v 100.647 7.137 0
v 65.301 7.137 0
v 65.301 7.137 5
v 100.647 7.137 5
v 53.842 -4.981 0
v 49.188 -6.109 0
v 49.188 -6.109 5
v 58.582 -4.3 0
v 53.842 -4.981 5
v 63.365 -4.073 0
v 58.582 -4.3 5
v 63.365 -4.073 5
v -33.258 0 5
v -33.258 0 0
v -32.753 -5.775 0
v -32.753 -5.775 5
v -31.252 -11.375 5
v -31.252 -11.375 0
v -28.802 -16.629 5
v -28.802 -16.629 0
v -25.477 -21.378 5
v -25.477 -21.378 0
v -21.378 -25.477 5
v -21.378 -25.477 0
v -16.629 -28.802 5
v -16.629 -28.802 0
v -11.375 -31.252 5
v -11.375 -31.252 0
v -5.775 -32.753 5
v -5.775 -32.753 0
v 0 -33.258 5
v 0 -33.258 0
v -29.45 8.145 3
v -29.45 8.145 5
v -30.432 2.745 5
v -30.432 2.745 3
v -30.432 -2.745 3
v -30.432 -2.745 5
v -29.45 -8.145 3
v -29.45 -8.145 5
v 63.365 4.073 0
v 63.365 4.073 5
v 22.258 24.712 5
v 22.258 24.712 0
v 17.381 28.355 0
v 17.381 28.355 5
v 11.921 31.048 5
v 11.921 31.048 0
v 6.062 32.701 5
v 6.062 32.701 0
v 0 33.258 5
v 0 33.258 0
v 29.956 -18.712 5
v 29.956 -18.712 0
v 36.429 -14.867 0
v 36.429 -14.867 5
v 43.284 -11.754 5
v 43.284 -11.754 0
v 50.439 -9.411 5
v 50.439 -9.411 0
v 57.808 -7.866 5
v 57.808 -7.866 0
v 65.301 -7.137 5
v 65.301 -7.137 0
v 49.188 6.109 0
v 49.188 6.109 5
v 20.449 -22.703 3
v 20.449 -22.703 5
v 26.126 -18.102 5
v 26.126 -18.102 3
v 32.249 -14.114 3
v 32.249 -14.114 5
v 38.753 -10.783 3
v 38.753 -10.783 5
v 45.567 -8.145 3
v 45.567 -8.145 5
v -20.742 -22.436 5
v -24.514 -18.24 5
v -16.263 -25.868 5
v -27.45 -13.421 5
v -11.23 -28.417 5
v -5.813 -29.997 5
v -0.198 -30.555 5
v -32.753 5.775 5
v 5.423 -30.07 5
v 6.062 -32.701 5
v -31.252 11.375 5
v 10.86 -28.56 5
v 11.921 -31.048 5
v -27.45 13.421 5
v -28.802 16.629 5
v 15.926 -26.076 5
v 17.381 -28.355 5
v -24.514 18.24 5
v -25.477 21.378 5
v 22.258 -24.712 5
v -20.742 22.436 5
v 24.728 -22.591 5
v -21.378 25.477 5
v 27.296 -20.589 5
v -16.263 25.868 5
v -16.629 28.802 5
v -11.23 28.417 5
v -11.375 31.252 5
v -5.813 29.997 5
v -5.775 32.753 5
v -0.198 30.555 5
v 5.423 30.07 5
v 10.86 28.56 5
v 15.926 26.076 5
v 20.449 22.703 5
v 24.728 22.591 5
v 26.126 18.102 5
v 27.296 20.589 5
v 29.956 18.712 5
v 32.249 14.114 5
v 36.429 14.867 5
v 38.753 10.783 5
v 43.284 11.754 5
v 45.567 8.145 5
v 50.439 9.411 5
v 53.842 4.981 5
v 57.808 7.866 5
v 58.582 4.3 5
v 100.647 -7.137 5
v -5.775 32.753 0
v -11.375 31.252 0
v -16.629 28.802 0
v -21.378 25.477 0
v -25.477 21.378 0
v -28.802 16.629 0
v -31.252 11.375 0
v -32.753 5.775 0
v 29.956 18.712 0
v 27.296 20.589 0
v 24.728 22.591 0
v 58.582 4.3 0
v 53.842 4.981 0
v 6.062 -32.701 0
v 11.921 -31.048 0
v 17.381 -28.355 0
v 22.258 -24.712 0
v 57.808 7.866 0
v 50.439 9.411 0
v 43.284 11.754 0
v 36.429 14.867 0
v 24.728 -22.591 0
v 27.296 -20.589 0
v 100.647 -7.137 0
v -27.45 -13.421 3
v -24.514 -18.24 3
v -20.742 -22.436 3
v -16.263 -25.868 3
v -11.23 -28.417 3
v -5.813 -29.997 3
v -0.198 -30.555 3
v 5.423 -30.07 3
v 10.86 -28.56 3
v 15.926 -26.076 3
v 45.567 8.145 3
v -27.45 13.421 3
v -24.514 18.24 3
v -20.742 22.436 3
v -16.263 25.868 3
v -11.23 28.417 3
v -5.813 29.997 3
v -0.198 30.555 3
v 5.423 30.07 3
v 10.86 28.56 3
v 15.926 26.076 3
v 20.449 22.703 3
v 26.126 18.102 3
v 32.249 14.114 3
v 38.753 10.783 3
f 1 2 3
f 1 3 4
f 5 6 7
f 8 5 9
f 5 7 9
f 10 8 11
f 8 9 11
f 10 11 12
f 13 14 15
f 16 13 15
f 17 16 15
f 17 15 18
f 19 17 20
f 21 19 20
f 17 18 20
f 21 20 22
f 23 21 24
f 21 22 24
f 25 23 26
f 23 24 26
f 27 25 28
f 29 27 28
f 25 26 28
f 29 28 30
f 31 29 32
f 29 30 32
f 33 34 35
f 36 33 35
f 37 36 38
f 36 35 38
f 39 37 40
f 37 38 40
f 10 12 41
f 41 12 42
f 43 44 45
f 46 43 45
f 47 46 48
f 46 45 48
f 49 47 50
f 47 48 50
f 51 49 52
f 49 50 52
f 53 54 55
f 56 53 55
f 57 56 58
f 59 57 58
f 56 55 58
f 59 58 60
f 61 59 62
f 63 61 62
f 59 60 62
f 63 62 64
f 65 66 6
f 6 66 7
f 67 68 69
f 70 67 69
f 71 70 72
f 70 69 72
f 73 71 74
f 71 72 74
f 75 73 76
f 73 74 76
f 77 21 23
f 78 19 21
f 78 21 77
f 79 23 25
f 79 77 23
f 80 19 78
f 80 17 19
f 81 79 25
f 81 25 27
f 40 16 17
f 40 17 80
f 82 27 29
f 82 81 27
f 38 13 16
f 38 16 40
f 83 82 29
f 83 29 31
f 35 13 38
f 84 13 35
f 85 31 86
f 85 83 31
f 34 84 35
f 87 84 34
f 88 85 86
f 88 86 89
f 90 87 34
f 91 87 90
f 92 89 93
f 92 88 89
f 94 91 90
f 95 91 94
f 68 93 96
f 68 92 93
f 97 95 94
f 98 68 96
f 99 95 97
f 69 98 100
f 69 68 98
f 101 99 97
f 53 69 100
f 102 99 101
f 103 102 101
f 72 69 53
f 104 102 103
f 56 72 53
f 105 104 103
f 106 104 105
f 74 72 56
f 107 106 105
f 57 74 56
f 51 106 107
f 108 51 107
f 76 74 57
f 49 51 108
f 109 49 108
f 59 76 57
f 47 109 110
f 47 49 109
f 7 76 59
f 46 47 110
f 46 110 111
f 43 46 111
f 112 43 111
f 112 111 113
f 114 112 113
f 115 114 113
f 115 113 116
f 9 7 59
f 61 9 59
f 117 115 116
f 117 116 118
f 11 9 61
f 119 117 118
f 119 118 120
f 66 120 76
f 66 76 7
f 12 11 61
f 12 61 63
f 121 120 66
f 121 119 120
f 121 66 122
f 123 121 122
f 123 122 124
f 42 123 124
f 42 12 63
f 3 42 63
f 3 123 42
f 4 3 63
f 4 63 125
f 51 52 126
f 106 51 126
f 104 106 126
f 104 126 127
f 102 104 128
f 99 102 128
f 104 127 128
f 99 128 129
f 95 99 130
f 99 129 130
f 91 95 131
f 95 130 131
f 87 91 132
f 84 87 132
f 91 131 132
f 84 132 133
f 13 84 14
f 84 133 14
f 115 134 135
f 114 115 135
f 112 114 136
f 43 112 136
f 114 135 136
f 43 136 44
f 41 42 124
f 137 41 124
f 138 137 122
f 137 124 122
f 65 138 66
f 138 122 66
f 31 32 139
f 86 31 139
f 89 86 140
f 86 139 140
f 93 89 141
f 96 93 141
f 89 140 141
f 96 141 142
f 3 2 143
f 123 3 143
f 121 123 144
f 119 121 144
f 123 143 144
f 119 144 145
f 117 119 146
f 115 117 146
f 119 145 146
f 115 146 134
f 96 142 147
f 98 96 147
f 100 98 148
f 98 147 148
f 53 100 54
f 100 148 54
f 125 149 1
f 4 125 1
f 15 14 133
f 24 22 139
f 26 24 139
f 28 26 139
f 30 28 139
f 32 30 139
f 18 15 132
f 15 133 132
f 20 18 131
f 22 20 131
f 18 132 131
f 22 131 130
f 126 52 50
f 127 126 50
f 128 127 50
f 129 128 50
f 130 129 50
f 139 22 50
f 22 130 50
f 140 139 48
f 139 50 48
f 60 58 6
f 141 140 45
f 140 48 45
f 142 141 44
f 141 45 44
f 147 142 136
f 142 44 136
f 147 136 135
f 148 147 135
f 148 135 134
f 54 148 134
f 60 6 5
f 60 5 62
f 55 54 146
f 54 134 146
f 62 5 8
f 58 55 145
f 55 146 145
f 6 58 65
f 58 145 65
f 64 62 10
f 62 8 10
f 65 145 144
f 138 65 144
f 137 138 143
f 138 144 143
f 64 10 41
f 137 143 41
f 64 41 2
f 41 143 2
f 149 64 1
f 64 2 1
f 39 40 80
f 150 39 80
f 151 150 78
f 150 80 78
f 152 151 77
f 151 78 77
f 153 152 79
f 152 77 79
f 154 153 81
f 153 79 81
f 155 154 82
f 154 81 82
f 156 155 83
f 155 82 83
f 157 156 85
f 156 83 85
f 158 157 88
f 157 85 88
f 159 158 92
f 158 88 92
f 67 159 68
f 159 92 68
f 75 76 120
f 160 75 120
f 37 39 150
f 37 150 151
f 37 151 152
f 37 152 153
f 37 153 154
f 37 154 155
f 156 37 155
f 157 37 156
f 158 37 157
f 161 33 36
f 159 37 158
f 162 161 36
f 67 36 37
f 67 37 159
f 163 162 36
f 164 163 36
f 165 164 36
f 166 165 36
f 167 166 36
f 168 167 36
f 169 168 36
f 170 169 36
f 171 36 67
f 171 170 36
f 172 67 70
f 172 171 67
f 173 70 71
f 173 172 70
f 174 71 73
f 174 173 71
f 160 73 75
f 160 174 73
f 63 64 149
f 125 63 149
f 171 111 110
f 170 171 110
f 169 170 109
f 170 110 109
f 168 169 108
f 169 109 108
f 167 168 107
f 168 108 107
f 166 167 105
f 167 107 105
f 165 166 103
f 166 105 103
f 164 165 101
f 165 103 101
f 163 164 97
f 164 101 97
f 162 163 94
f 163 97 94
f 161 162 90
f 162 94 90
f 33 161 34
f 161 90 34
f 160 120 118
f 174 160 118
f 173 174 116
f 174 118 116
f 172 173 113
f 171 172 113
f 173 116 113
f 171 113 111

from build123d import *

# Parameters (mm, degrees)
F0_W     = 29.9560762942
F0_H     = 7.1370224468
F0_W_2   = 35.3452544659
F1_DEPTH = 5
F2_W     = 3.7603338286
F2_H     = 4.0725159595
F2_W_2   = 14.1769461334
F3_DEPTH = 2
F4_DEPTH = 25


with BuildPart() as f1:
    # F0 (on Top) → F1 (new body)
    with BuildSketch(Plane.XY):
        with BuildLine():
            Line((0, 7.1370224468), (0, 33.2578741251))
            ThreePointArc((0, 33.2578741251), (-23.5168683217, 23.5168683217), (-33.2578741251, 0))
            Line((-33.2578741251, 0), (-29.9560762942, 0))
            Line((-29.9560762942, 0), (-29.9560762942, 7.1370224468))
            Line((-29.9560762942, 7.1370224468), (0, 7.1370224468))
        make_face()
        with BuildLine():
            Line((-29.9560762942, 0), (-33.2578741251, 0))
            ThreePointArc((-33.2578741251, 0), (-23.5168683217, -23.5168683217), (0, -33.2578741251))
            Line((0, -33.2578741251), (0, -7.1370224468))
            Line((0, -7.1370224468), (-29.9560762942, -7.1370224468))
            Line((-29.9560762942, -7.1370224468), (-29.9560762942, 0))
        make_face()
        with Locations((-14.9780381471, -3.5685112234)):
            Rectangle(F0_W, F0_H)
        with Locations((-14.9780381471, 3.5685112234)):
            Rectangle(F0_W, F0_H)
        with BuildLine():
            Line((0, -7.1370224468), (0, -33.2578741251))
            ThreePointArc((0, -33.2578741251), (11.9212758791, -31.0478561697), (22.2581910956, -24.7115179719))
            Line((22.2581910956, -24.7115179719), (6.4284682817, -7.1370224468))
            Line((6.4284682817, -7.1370224468), (0, -7.1370224468))
        make_face()
        with BuildLine():
            Line((29.9560762942, -7.1370224468), (6.4284682817, -7.1370224468))
            Line((6.4284682817, -7.1370224468), (22.2581910956, -24.7115179719))
            ThreePointArc((22.2581910956, -24.7115179719), (26.6068003283, -19.95405642), (29.9560762942, -14.4471341234))
            Line((29.9560762942, -14.4471341234), (29.9560762942, -7.1370224468))
        make_face()
        Polygon((6.4284682817, -7.1370224468), (0, 0), (0, -7.1370224468), align=None)
        Polygon((29.9560762942, 0), (0, 0), (6.4284682817, -7.1370224468), (29.9560762942, -7.1370224468), align=None)
        Polygon((29.9560762942, 7.1370224468), (6.4284682817, 7.1370224468), (0, 0), (29.9560762942, 0), align=None)
        Polygon((0, 0), (6.4284682817, 7.1370224468), (0, 7.1370224468), align=None)
        with BuildLine():
            ThreePointArc((29.9560762942, 14.4471341234), (26.6068003283, 19.95405642), (22.2581910956, 24.7115179719))
            Line((22.2581910956, 24.7115179719), (6.4284682817, 7.1370224468))
            Line((6.4284682817, 7.1370224468), (29.9560762942, 7.1370224468))
            Line((29.9560762942, 7.1370224468), (29.9560762942, 14.4471341234))
        make_face()
        with BuildLine():
            Line((6.4284682817, 7.1370224468), (22.2581910956, 24.7115179719))
            ThreePointArc((22.2581910956, 24.7115179719), (11.9212758791, 31.0478561697), (0, 33.2578741251))
            Line((0, 33.2578741251), (0, 7.1370224468))
            Line((0, 7.1370224468), (6.4284682817, 7.1370224468))
        make_face()
        with BuildLine():
            ThreePointArc((29.9560762942, 18.7118758373), (26.0003436233, 21.5746791136), (22.2581910956, 24.7115179719))
            ThreePointArc((22.2581910956, 24.7115179719), (26.6068003283, 19.95405642), (29.9560762942, 14.4471341234))
            Line((29.9560762942, 14.4471341234), (29.9560762942, 18.7118758373))
        make_face()
        with BuildLine():
            ThreePointArc((29.9560762942, -14.4471341234), (26.6068003283, -19.95405642), (22.2581910956, -24.7115179719))
            ThreePointArc((22.2581910956, -24.7115179719), (26.0003436233, -21.5746791136), (29.9560762942, -18.7118758373))
            Line((29.9560762942, -18.7118758373), (29.9560762942, -14.4471341234))
        make_face()
        with BuildLine():
            ThreePointArc((29.9560762942, -14.4471341234), (31.4327985964, -10.8657886838), (32.4830586909, -7.1370224468))
            Line((32.4830586909, -7.1370224468), (29.9560762942, -7.1370224468))
            Line((29.9560762942, -7.1370224468), (29.9560762942, -14.4471341234))
        make_face()
        with BuildLine():
            ThreePointArc((32.4830586909, -7.1370224468), (33.0636028622, -3.5894786656), (33.2578741251, 0))
            Line((33.2578741251, 0), (29.9560762942, 0))
            Line((29.9560762942, 0), (29.9560762942, -7.1370224468))
            Line((29.9560762942, -7.1370224468), (32.4830586909, -7.1370224468))
        make_face()
        with BuildLine():
            ThreePointArc((33.2578741251, 0), (33.0636028622, 3.5894786656), (32.4830586909, 7.1370224468))
            Line((32.4830586909, 7.1370224468), (29.9560762942, 7.1370224468))
            Line((29.9560762942, 7.1370224468), (29.9560762942, 0))
            Line((29.9560762942, 0), (33.2578741251, 0))
        make_face()
        with BuildLine():
            ThreePointArc((32.4830586909, 7.1370224468), (31.4327985964, 10.8657886838), (29.9560762942, 14.4471341234))
            Line((29.9560762942, 14.4471341234), (29.9560762942, 7.1370224468))
            Line((29.9560762942, 7.1370224468), (32.4830586909, 7.1370224468))
        make_face()
        with BuildLine():
            Line((29.9560762942, 18.7118758373), (29.9560762942, 14.4471341234))
            ThreePointArc((29.9560762942, 14.4471341234), (31.4327985964, 10.8657886838), (32.4830586909, 7.1370224468))
            Line((32.4830586909, 7.1370224468), (65.3013307601, 7.1370224468))
            ThreePointArc((65.3013307601, 7.1370224468), (46.829633004, 10.4843879142), (29.9560762942, 18.7118758373))
        make_face()
        with BuildLine():
            Line((65.3013307601, 7.1370224468), (32.4830586909, 7.1370224468))
            ThreePointArc((32.4830586909, 7.1370224468), (33.0636028622, 3.5894786656), (33.2578741251, 0))
            Line((33.2578741251, 0), (65.3013307601, 0))
            Line((65.3013307601, 0), (65.3013307601, 7.1370224468))
        make_face()
        with BuildLine():
            Line((65.3013307601, 0), (33.2578741251, 0))
            ThreePointArc((33.2578741251, 0), (33.0636028622, -3.5894786656), (32.4830586909, -7.1370224468))
            Line((32.4830586909, -7.1370224468), (65.3013307601, -7.1370224468))
            Line((65.3013307601, -7.1370224468), (65.3013307601, 0))
        make_face()
        with BuildLine():
            Line((65.3013307601, -7.1370224468), (32.4830586909, -7.1370224468))
            ThreePointArc((32.4830586909, -7.1370224468), (31.4327985964, -10.8657886838), (29.9560762942, -14.4471341234))
            Line((29.9560762942, -14.4471341234), (29.9560762942, -18.7118758373))
            ThreePointArc((29.9560762942, -18.7118758373), (46.829633004, -10.4843879142), (65.3013307601, -7.1370224468))
        make_face()
        with Locations((82.9739579931, -3.5685112234)):
            Rectangle(F0_W_2, F0_H)
        with Locations((82.9739579931, 3.5685112234)):
            Rectangle(F0_W_2, F0_H)
    extrude(amount=F1_DEPTH)

    # F2 (on face) → F3 (cut)
    with BuildSketch(Plane.XY.offset(5)):
        with BuildLine():
            Line((7.3364039044, 8.145031919), (29.4496861323, 8.145031919))
            ThreePointArc((29.4496861323, 8.145031919), (25.9897625324, 16.0672898076), (20.4494554433, 22.703421115))
            Line((20.4494554433, 22.703421115), (7.3364039044, 8.145031919))
        make_face()
        with BuildLine():
            Line((45.5672070233, 8.145031919), (29.4496861323, 8.145031919))
            ThreePointArc((29.4496861323, 8.145031919), (29.9355135784, 6.1229555814), (30.2826711505, 4.0725159595))
            Line((30.2826711505, 4.0725159595), (45.5672070233, 4.0725159595))
            Line((45.5672070233, 4.0725159595), (45.5672070233, 5.9387854649))
            Line((45.5672070233, 5.9387854649), (45.5672070233, 8.145031919))
        make_face()
        Polygon((29.4496861323, 4.0725159595), (29.4496861323, 8.145031919), (7.3364039044, 8.145031919), (3.6682019522, 4.0725159595), (25.6893523037, 4.0725159595), align=None)
        with BuildLine():
            ThreePointArc((30.2826711505, 4.0725159595), (29.9355135784, 6.1229555814), (29.4496861323, 8.145031919))
            Line((29.4496861323, 8.145031919), (29.4496861323, 4.0725159595))
            Line((29.4496861323, 4.0725159595), (30.2826711505, 4.0725159595))
        make_face()
        with BuildLine():
            ThreePointArc((20.4494554433, 22.703421115), (25.9897625324, 16.0672898076), (29.4496861323, 8.145031919))
            Line((29.4496861323, 8.145031919), (45.5672070233, 8.145031919))
            ThreePointArc((45.5672070233, 8.145031919), (32.2488302064, 14.1138509074), (20.4494554433, 22.703421115))
        make_face()
        with BuildLine():
            Line((7.3364039044, 8.145031919), (20.4494554433, 22.703421115))
            ThreePointArc((20.4494554433, 22.703421115), (-8.557903488, 29.3323685737), (-29.4496861323, 8.145031919))
            Line((-29.4496861323, 8.145031919), (7.3364039044, 8.145031919))
        make_face()
        with BuildLine():
            Line((45.5672070233, 4.0725159595), (30.2826711505, 4.0725159595))
            ThreePointArc((30.2826711505, 4.0725159595), (30.4870567923, 2.0408151309), (30.5552869116, 0))
            Line((30.5552869116, 0), (45.5672070233, 0))
            Line((45.5672070233, 0), (45.5672070233, 4.0725159595))
        make_face()
        with BuildLine():
            ThreePointArc((30.5552869116, 0), (30.4870567923, 2.0408151309), (30.2826711505, 4.0725159595))
            Line((30.2826711505, 4.0725159595), (29.4496861323, 4.0725159595))
            Line((29.4496861323, 4.0725159595), (29.4496861323, 0))
            Line((29.4496861323, 0), (30.5552869116, 0))
        make_face()
        Polygon((3.6682019522, 4.0725159595), (7.3364039044, 8.145031919), (-29.4496861323, 8.145031919), (-29.4496861323, -8.145031919), (7.3364039044, -8.145031919), (3.6682019522, -4.0725159595), (-25.6893523037, -4.0725159595), (-25.6893523037, 4.0725159595), align=None)
        with Locations((27.569519218, 2.0362579798)):
            Rectangle(F2_W, F2_H)
        with BuildLine():
            Line((-29.4496861323, -8.145031919), (-29.4496861323, 8.145031919))
            ThreePointArc((-29.4496861323, 8.145031919), (-30.5552869116, 0), (-29.4496861323, -8.145031919))
        make_face()
        with BuildLine():
            Line((45.5672070233, 0), (30.5552869116, 0))
            ThreePointArc((30.5552869116, 0), (30.4870567923, -2.0408151309), (30.2826711505, -4.0725159595))
            Line((30.2826711505, -4.0725159595), (45.5672070233, -4.0725159595))
            Line((45.5672070233, -4.0725159595), (45.5672070233, 0))
        make_face()
        with BuildLine():
            ThreePointArc((30.2826711505, -4.0725159595), (30.4870567923, -2.0408151309), (30.5552869116, 0))
            Line((30.5552869116, 0), (29.4496861323, 0))
            Line((29.4496861323, 0), (29.4496861323, -4.0725159595))
            Line((29.4496861323, -4.0725159595), (30.2826711505, -4.0725159595))
        make_face()
        Polygon((25.6893523037, 4.0725159595), (3.6682019522, 4.0725159595), (0, 0), (25.6893523037, 0), align=None)
        Polygon((0, 0), (3.6682019522, 4.0725159595), (-25.6893523037, 4.0725159595), (-25.6893523037, -4.0725159595), (3.6682019522, -4.0725159595), align=None)
        with Locations((27.569519218, -2.0362579798)):
            Rectangle(F2_W, F2_H)
        with BuildLine():
            Line((7.3364039044, -8.145031919), (-29.4496861323, -8.145031919))
            ThreePointArc((-29.4496861323, -8.145031919), (-8.557903488, -29.3323685737), (20.4494554433, -22.703421115))
            Line((20.4494554433, -22.703421115), (7.3364039044, -8.145031919))
        make_face()
        with BuildLine():
            Line((45.5672070233, -4.0725159595), (30.2826711505, -4.0725159595))
            ThreePointArc((30.2826711505, -4.0725159595), (29.9355135784, -6.1229555814), (29.4496861323, -8.145031919))
            Line((29.4496861323, -8.145031919), (45.5672070233, -8.145031919))
            Line((45.5672070233, -8.145031919), (45.5672070233, -5.9387854649))
            Line((45.5672070233, -5.9387854649), (45.5672070233, -4.0725159595))
        make_face()
        with BuildLine():
            ThreePointArc((29.4496861323, -8.145031919), (29.9355135784, -6.1229555814), (30.2826711505, -4.0725159595))
            Line((30.2826711505, -4.0725159595), (29.4496861323, -4.0725159595))
            Line((29.4496861323, -4.0725159595), (29.4496861323, -8.145031919))
        make_face()
        with BuildLine():
            Line((49.188118428, 6.1087739393), (49.188118428, 4.0725159595))
            Line((49.188118428, 4.0725159595), (63.3650645614, 4.0725159595))
            ThreePointArc((63.3650645614, 4.0725159595), (56.2038469933, 4.5841792227), (49.188118428, 6.1087739393))
        make_face()
        with Locations((56.2765914947, 2.0362579798)):
            Rectangle(F2_W_2, F2_H)
        Polygon((25.6893523037, 0), (0, 0), (3.6682019522, -4.0725159595), (25.6893523037, -4.0725159595), align=None)
        Polygon((29.4496861323, -8.145031919), (29.4496861323, -4.0725159595), (25.6893523037, -4.0725159595), (3.6682019522, -4.0725159595), (7.3364039044, -8.145031919), align=None)
        with BuildLine():
            Line((7.3364039044, -8.145031919), (20.4494554433, -22.703421115))
            ThreePointArc((20.4494554433, -22.703421115), (25.9897625324, -16.0672898076), (29.4496861323, -8.145031919))
            Line((29.4496861323, -8.145031919), (7.3364039044, -8.145031919))
        make_face()
        with BuildLine():
            ThreePointArc((29.4496861323, -8.145031919), (25.9897625324, -16.0672898076), (20.4494554433, -22.703421115))
            ThreePointArc((20.4494554433, -22.703421115), (32.2488302064, -14.1138509074), (45.5672070233, -8.145031919))
            Line((45.5672070233, -8.145031919), (29.4496861323, -8.145031919))
        make_face()
        with Locations((56.2765914947, -2.0362579798)):
            Rectangle(F2_W_2, F2_H)
        with BuildLine():
            Line((63.3650645614, -4.0725159595), (49.188118428, -4.0725159595))
            Line((49.188118428, -4.0725159595), (49.188118428, -6.1087739393))
            ThreePointArc((49.188118428, -6.1087739393), (56.2038469933, -4.5841792227), (63.3650645614, -4.0725159595))
        make_face()
    extrude(amount=-F3_DEPTH, mode=Mode.SUBTRACT)

    # F4 (cut): a face of the model
    f4_faces = [f1.faces().sort_by_distance(p)[0] for p in [
        (55.7717921827, 0, 3),
    ]]
    extrude(f4_faces, amount=-F4_DEPTH, mode=Mode.SUBTRACT)


solid = f1.part
